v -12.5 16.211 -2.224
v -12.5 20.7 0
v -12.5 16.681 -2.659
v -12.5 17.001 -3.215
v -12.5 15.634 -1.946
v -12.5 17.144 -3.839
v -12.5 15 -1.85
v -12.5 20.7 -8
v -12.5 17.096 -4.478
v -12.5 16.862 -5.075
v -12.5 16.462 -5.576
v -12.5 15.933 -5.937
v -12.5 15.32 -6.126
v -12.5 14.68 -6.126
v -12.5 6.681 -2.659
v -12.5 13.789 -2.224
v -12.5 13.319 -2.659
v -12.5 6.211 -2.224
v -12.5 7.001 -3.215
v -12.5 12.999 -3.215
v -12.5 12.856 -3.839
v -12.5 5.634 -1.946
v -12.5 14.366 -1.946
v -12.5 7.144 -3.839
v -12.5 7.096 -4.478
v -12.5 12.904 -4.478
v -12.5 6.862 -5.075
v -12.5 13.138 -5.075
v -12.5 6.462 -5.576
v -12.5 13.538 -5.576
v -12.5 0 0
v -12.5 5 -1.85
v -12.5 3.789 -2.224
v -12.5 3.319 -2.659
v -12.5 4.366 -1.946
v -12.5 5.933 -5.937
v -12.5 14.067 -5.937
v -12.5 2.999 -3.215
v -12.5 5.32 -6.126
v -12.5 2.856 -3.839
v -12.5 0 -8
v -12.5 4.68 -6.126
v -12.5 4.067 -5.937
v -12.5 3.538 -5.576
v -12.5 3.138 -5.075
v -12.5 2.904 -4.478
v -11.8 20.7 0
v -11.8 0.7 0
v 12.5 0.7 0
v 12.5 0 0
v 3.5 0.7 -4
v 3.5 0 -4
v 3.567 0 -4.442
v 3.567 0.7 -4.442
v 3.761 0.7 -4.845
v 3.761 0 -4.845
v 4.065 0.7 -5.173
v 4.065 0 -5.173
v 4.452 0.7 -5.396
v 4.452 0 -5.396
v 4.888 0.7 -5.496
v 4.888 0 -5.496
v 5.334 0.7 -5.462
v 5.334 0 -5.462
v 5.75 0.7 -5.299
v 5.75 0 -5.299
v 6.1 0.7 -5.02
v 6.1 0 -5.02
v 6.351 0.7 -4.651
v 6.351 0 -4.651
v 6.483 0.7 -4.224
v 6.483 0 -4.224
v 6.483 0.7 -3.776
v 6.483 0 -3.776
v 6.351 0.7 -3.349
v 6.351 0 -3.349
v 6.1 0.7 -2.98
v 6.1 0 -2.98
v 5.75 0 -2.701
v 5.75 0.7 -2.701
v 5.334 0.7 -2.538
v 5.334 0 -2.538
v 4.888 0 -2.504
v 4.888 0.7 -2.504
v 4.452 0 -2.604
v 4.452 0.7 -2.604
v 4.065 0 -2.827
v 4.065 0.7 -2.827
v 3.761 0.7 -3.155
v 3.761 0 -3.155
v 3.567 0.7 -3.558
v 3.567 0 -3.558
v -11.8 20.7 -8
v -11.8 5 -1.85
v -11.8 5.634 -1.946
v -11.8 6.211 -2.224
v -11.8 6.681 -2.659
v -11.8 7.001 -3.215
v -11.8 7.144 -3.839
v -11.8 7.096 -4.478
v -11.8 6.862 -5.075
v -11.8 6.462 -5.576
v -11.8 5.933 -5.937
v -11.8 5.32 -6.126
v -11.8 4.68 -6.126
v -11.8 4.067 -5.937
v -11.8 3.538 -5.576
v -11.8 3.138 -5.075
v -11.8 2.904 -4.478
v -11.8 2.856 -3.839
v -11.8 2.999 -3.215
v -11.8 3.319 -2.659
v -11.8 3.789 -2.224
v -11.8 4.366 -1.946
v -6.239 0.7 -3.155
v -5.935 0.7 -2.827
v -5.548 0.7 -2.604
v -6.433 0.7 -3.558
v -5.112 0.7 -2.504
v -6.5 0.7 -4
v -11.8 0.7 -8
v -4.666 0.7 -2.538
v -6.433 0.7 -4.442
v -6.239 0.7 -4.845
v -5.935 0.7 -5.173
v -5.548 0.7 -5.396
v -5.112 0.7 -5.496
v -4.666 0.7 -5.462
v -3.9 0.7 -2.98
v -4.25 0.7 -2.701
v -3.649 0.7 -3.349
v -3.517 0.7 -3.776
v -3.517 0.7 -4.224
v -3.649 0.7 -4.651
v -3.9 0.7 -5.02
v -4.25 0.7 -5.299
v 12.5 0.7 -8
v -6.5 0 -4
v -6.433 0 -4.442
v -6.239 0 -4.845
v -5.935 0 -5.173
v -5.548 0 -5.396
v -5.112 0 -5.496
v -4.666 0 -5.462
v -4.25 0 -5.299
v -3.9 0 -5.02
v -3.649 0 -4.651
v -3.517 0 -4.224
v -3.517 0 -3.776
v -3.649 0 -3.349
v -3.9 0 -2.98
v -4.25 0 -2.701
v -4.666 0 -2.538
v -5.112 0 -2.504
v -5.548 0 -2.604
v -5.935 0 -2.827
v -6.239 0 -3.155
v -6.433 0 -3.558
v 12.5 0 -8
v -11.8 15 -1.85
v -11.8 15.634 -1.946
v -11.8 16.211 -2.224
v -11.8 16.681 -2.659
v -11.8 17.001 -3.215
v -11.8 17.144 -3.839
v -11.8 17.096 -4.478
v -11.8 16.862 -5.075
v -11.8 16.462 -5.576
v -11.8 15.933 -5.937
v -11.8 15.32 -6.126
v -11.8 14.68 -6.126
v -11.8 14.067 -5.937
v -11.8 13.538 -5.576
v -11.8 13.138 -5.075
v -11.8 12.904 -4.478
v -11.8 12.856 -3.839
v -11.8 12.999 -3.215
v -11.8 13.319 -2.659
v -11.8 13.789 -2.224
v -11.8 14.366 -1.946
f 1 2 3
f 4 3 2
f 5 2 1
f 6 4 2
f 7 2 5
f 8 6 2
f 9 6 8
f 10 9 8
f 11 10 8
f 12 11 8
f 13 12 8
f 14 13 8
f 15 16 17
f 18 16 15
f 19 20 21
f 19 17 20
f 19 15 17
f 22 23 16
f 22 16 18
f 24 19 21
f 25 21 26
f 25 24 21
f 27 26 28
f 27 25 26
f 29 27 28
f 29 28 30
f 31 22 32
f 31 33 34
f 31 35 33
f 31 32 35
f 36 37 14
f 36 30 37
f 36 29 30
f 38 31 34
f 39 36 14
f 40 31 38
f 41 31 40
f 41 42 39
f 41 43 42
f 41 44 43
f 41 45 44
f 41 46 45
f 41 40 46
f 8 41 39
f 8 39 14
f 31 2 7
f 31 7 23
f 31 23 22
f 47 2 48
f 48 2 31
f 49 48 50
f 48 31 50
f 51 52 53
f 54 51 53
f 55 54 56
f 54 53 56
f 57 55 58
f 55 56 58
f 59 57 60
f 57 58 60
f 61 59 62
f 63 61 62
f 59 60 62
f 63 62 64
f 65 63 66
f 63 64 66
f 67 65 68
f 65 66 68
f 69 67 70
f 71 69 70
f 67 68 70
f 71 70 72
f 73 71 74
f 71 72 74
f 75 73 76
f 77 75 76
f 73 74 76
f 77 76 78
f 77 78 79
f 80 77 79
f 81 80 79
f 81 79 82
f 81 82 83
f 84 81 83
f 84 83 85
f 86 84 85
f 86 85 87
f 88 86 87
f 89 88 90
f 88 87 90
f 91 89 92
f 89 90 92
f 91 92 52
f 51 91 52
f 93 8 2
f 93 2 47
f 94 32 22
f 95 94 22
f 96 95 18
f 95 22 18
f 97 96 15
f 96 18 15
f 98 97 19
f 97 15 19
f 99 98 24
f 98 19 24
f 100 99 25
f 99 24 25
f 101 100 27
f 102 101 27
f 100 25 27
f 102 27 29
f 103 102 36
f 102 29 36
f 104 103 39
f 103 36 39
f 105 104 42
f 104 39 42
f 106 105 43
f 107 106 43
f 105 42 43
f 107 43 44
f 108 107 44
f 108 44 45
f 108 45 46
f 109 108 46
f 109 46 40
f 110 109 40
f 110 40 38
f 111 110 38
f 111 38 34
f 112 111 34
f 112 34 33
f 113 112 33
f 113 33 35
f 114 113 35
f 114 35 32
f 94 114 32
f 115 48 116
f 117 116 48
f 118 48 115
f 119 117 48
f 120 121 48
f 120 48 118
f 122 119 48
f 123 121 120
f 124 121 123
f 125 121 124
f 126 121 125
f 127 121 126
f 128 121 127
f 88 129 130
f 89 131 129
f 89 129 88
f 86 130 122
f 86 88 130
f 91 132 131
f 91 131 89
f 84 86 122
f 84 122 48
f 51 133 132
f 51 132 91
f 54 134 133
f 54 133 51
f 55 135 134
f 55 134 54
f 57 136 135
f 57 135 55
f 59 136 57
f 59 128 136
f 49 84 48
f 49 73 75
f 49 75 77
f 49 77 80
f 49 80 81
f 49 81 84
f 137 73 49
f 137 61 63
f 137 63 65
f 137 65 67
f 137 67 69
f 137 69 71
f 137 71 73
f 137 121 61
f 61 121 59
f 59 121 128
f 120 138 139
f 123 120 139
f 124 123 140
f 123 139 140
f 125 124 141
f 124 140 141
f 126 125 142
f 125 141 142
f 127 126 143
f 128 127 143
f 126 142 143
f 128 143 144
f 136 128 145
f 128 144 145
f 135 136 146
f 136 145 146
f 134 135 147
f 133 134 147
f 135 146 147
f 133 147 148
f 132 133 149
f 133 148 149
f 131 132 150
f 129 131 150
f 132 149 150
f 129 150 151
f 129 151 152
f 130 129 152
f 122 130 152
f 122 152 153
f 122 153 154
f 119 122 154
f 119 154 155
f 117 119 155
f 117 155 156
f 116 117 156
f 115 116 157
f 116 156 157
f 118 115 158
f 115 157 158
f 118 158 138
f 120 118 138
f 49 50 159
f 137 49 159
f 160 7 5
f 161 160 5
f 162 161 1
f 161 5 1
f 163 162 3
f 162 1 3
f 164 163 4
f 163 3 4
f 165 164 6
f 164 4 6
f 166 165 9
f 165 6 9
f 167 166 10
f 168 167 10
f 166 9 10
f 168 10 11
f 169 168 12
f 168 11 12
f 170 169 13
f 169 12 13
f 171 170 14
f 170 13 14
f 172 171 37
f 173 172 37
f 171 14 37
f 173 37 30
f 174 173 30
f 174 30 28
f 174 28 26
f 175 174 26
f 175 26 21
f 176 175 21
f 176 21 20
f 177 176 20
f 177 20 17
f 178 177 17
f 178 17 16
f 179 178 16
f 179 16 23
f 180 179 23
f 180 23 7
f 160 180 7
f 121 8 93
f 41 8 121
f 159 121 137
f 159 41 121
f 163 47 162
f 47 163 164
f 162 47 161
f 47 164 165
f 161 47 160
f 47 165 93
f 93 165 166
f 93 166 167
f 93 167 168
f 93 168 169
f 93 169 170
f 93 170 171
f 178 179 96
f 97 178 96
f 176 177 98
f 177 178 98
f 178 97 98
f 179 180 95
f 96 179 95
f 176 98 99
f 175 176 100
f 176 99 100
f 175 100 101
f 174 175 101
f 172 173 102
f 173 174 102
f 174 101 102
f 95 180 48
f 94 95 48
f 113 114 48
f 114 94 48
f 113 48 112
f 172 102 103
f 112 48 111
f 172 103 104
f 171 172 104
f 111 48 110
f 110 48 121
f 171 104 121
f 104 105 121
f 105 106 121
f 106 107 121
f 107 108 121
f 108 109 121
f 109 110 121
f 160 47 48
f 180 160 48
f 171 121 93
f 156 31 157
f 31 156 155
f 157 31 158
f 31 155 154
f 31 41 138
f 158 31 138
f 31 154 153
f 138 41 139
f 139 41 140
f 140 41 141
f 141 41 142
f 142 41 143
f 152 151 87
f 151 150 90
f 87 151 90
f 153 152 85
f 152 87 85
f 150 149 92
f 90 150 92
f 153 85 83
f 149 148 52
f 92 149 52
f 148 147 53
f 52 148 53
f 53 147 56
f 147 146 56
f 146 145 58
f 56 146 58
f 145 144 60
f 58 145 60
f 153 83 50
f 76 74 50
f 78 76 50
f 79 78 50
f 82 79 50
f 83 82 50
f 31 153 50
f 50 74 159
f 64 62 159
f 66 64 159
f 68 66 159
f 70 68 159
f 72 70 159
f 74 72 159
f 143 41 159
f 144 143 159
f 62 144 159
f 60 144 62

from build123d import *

# Parameters (mm, degrees)
BOSS_EXTRUDE1_DEPTH = 0.7
SKETCH3_W           = 0.7
SKETCH3_H           = 8
BOSS_EXTRUDE3_DEPTH = 20
SKETCH4_R           = 2.15
CUT_EXTRUDE1_DEPTH  = 34.42887973


with BuildPart() as part:
    # Sketch1 → Boss-Extrude1 (new body)
    with BuildSketch(Plane(origin=(0, 0, 0), x_dir=(1, 0, 0), z_dir=(0, 1, 0))):
        with BuildLine():
            Line((0, 0), (0, 4))
            Line((0, 4), (-3.5, 4))
            ThreePointArc((-3.5, 4), (-5, 2.5), (-6.5, 4))
            Line((-6.5, 4), (-12.5, 4))
            Line((-12.5, 4), (-12.5, 0))
            Line((-12.5, 0), (0, 0))
        make_face()
        with BuildLine():
            Line((12.5, 4), (6.5, 4))
            ThreePointArc((6.5, 4), (5, 2.5), (3.5, 4))
            Line((3.5, 4), (0, 4))
            Line((0, 4), (0, 0))
            Line((0, 0), (12.5, 0))
            Line((12.5, 0), (12.5, 4))
        make_face()
        with BuildLine():
            ThreePointArc((3.5, 4), (5, 5.5), (6.5, 4))
            Line((6.5, 4), (12.5, 4))
            Line((12.5, 4), (12.5, 8))
            Line((12.5, 8), (0, 8))
            Line((0, 8), (0, 4))
            Line((0, 4), (3.5, 4))
        make_face()
        with BuildLine():
            Line((-3.5, 4), (0, 4))
            Line((0, 4), (0, 8))
            Line((0, 8), (-12.5, 8))
            Line((-12.5, 8), (-12.5, 4))
            Line((-12.5, 4), (-6.5, 4))
            ThreePointArc((-6.5, 4), (-5, 5.5), (-3.5, 4))
        make_face()
    extrude(amount=BOSS_EXTRUDE1_DEPTH)

    # Sketch3 → Boss-Extrude3 (add)
    with BuildSketch(Plane(origin=(0, 0.7, 0), x_dir=(1, 0, 0), z_dir=(0, 1, 0))):
        with Locations((-12.15, 4)):
            Rectangle(SKETCH3_W, SKETCH3_H)
    extrude(amount=BOSS_EXTRUDE3_DEPTH)

    # Sketch4 → Cut-Extrude1 (cut, through all)
    with BuildSketch(Plane.ZY.offset(12.5)):
        with Locations((-4, 5)):
            Circle(SKETCH4_R)
        with Locations((-4, 15)):
            Circle(SKETCH4_R)
    extrude(amount=-CUT_EXTRUDE1_DEPTH, mode=Mode.SUBTRACT)


solid = part.part
